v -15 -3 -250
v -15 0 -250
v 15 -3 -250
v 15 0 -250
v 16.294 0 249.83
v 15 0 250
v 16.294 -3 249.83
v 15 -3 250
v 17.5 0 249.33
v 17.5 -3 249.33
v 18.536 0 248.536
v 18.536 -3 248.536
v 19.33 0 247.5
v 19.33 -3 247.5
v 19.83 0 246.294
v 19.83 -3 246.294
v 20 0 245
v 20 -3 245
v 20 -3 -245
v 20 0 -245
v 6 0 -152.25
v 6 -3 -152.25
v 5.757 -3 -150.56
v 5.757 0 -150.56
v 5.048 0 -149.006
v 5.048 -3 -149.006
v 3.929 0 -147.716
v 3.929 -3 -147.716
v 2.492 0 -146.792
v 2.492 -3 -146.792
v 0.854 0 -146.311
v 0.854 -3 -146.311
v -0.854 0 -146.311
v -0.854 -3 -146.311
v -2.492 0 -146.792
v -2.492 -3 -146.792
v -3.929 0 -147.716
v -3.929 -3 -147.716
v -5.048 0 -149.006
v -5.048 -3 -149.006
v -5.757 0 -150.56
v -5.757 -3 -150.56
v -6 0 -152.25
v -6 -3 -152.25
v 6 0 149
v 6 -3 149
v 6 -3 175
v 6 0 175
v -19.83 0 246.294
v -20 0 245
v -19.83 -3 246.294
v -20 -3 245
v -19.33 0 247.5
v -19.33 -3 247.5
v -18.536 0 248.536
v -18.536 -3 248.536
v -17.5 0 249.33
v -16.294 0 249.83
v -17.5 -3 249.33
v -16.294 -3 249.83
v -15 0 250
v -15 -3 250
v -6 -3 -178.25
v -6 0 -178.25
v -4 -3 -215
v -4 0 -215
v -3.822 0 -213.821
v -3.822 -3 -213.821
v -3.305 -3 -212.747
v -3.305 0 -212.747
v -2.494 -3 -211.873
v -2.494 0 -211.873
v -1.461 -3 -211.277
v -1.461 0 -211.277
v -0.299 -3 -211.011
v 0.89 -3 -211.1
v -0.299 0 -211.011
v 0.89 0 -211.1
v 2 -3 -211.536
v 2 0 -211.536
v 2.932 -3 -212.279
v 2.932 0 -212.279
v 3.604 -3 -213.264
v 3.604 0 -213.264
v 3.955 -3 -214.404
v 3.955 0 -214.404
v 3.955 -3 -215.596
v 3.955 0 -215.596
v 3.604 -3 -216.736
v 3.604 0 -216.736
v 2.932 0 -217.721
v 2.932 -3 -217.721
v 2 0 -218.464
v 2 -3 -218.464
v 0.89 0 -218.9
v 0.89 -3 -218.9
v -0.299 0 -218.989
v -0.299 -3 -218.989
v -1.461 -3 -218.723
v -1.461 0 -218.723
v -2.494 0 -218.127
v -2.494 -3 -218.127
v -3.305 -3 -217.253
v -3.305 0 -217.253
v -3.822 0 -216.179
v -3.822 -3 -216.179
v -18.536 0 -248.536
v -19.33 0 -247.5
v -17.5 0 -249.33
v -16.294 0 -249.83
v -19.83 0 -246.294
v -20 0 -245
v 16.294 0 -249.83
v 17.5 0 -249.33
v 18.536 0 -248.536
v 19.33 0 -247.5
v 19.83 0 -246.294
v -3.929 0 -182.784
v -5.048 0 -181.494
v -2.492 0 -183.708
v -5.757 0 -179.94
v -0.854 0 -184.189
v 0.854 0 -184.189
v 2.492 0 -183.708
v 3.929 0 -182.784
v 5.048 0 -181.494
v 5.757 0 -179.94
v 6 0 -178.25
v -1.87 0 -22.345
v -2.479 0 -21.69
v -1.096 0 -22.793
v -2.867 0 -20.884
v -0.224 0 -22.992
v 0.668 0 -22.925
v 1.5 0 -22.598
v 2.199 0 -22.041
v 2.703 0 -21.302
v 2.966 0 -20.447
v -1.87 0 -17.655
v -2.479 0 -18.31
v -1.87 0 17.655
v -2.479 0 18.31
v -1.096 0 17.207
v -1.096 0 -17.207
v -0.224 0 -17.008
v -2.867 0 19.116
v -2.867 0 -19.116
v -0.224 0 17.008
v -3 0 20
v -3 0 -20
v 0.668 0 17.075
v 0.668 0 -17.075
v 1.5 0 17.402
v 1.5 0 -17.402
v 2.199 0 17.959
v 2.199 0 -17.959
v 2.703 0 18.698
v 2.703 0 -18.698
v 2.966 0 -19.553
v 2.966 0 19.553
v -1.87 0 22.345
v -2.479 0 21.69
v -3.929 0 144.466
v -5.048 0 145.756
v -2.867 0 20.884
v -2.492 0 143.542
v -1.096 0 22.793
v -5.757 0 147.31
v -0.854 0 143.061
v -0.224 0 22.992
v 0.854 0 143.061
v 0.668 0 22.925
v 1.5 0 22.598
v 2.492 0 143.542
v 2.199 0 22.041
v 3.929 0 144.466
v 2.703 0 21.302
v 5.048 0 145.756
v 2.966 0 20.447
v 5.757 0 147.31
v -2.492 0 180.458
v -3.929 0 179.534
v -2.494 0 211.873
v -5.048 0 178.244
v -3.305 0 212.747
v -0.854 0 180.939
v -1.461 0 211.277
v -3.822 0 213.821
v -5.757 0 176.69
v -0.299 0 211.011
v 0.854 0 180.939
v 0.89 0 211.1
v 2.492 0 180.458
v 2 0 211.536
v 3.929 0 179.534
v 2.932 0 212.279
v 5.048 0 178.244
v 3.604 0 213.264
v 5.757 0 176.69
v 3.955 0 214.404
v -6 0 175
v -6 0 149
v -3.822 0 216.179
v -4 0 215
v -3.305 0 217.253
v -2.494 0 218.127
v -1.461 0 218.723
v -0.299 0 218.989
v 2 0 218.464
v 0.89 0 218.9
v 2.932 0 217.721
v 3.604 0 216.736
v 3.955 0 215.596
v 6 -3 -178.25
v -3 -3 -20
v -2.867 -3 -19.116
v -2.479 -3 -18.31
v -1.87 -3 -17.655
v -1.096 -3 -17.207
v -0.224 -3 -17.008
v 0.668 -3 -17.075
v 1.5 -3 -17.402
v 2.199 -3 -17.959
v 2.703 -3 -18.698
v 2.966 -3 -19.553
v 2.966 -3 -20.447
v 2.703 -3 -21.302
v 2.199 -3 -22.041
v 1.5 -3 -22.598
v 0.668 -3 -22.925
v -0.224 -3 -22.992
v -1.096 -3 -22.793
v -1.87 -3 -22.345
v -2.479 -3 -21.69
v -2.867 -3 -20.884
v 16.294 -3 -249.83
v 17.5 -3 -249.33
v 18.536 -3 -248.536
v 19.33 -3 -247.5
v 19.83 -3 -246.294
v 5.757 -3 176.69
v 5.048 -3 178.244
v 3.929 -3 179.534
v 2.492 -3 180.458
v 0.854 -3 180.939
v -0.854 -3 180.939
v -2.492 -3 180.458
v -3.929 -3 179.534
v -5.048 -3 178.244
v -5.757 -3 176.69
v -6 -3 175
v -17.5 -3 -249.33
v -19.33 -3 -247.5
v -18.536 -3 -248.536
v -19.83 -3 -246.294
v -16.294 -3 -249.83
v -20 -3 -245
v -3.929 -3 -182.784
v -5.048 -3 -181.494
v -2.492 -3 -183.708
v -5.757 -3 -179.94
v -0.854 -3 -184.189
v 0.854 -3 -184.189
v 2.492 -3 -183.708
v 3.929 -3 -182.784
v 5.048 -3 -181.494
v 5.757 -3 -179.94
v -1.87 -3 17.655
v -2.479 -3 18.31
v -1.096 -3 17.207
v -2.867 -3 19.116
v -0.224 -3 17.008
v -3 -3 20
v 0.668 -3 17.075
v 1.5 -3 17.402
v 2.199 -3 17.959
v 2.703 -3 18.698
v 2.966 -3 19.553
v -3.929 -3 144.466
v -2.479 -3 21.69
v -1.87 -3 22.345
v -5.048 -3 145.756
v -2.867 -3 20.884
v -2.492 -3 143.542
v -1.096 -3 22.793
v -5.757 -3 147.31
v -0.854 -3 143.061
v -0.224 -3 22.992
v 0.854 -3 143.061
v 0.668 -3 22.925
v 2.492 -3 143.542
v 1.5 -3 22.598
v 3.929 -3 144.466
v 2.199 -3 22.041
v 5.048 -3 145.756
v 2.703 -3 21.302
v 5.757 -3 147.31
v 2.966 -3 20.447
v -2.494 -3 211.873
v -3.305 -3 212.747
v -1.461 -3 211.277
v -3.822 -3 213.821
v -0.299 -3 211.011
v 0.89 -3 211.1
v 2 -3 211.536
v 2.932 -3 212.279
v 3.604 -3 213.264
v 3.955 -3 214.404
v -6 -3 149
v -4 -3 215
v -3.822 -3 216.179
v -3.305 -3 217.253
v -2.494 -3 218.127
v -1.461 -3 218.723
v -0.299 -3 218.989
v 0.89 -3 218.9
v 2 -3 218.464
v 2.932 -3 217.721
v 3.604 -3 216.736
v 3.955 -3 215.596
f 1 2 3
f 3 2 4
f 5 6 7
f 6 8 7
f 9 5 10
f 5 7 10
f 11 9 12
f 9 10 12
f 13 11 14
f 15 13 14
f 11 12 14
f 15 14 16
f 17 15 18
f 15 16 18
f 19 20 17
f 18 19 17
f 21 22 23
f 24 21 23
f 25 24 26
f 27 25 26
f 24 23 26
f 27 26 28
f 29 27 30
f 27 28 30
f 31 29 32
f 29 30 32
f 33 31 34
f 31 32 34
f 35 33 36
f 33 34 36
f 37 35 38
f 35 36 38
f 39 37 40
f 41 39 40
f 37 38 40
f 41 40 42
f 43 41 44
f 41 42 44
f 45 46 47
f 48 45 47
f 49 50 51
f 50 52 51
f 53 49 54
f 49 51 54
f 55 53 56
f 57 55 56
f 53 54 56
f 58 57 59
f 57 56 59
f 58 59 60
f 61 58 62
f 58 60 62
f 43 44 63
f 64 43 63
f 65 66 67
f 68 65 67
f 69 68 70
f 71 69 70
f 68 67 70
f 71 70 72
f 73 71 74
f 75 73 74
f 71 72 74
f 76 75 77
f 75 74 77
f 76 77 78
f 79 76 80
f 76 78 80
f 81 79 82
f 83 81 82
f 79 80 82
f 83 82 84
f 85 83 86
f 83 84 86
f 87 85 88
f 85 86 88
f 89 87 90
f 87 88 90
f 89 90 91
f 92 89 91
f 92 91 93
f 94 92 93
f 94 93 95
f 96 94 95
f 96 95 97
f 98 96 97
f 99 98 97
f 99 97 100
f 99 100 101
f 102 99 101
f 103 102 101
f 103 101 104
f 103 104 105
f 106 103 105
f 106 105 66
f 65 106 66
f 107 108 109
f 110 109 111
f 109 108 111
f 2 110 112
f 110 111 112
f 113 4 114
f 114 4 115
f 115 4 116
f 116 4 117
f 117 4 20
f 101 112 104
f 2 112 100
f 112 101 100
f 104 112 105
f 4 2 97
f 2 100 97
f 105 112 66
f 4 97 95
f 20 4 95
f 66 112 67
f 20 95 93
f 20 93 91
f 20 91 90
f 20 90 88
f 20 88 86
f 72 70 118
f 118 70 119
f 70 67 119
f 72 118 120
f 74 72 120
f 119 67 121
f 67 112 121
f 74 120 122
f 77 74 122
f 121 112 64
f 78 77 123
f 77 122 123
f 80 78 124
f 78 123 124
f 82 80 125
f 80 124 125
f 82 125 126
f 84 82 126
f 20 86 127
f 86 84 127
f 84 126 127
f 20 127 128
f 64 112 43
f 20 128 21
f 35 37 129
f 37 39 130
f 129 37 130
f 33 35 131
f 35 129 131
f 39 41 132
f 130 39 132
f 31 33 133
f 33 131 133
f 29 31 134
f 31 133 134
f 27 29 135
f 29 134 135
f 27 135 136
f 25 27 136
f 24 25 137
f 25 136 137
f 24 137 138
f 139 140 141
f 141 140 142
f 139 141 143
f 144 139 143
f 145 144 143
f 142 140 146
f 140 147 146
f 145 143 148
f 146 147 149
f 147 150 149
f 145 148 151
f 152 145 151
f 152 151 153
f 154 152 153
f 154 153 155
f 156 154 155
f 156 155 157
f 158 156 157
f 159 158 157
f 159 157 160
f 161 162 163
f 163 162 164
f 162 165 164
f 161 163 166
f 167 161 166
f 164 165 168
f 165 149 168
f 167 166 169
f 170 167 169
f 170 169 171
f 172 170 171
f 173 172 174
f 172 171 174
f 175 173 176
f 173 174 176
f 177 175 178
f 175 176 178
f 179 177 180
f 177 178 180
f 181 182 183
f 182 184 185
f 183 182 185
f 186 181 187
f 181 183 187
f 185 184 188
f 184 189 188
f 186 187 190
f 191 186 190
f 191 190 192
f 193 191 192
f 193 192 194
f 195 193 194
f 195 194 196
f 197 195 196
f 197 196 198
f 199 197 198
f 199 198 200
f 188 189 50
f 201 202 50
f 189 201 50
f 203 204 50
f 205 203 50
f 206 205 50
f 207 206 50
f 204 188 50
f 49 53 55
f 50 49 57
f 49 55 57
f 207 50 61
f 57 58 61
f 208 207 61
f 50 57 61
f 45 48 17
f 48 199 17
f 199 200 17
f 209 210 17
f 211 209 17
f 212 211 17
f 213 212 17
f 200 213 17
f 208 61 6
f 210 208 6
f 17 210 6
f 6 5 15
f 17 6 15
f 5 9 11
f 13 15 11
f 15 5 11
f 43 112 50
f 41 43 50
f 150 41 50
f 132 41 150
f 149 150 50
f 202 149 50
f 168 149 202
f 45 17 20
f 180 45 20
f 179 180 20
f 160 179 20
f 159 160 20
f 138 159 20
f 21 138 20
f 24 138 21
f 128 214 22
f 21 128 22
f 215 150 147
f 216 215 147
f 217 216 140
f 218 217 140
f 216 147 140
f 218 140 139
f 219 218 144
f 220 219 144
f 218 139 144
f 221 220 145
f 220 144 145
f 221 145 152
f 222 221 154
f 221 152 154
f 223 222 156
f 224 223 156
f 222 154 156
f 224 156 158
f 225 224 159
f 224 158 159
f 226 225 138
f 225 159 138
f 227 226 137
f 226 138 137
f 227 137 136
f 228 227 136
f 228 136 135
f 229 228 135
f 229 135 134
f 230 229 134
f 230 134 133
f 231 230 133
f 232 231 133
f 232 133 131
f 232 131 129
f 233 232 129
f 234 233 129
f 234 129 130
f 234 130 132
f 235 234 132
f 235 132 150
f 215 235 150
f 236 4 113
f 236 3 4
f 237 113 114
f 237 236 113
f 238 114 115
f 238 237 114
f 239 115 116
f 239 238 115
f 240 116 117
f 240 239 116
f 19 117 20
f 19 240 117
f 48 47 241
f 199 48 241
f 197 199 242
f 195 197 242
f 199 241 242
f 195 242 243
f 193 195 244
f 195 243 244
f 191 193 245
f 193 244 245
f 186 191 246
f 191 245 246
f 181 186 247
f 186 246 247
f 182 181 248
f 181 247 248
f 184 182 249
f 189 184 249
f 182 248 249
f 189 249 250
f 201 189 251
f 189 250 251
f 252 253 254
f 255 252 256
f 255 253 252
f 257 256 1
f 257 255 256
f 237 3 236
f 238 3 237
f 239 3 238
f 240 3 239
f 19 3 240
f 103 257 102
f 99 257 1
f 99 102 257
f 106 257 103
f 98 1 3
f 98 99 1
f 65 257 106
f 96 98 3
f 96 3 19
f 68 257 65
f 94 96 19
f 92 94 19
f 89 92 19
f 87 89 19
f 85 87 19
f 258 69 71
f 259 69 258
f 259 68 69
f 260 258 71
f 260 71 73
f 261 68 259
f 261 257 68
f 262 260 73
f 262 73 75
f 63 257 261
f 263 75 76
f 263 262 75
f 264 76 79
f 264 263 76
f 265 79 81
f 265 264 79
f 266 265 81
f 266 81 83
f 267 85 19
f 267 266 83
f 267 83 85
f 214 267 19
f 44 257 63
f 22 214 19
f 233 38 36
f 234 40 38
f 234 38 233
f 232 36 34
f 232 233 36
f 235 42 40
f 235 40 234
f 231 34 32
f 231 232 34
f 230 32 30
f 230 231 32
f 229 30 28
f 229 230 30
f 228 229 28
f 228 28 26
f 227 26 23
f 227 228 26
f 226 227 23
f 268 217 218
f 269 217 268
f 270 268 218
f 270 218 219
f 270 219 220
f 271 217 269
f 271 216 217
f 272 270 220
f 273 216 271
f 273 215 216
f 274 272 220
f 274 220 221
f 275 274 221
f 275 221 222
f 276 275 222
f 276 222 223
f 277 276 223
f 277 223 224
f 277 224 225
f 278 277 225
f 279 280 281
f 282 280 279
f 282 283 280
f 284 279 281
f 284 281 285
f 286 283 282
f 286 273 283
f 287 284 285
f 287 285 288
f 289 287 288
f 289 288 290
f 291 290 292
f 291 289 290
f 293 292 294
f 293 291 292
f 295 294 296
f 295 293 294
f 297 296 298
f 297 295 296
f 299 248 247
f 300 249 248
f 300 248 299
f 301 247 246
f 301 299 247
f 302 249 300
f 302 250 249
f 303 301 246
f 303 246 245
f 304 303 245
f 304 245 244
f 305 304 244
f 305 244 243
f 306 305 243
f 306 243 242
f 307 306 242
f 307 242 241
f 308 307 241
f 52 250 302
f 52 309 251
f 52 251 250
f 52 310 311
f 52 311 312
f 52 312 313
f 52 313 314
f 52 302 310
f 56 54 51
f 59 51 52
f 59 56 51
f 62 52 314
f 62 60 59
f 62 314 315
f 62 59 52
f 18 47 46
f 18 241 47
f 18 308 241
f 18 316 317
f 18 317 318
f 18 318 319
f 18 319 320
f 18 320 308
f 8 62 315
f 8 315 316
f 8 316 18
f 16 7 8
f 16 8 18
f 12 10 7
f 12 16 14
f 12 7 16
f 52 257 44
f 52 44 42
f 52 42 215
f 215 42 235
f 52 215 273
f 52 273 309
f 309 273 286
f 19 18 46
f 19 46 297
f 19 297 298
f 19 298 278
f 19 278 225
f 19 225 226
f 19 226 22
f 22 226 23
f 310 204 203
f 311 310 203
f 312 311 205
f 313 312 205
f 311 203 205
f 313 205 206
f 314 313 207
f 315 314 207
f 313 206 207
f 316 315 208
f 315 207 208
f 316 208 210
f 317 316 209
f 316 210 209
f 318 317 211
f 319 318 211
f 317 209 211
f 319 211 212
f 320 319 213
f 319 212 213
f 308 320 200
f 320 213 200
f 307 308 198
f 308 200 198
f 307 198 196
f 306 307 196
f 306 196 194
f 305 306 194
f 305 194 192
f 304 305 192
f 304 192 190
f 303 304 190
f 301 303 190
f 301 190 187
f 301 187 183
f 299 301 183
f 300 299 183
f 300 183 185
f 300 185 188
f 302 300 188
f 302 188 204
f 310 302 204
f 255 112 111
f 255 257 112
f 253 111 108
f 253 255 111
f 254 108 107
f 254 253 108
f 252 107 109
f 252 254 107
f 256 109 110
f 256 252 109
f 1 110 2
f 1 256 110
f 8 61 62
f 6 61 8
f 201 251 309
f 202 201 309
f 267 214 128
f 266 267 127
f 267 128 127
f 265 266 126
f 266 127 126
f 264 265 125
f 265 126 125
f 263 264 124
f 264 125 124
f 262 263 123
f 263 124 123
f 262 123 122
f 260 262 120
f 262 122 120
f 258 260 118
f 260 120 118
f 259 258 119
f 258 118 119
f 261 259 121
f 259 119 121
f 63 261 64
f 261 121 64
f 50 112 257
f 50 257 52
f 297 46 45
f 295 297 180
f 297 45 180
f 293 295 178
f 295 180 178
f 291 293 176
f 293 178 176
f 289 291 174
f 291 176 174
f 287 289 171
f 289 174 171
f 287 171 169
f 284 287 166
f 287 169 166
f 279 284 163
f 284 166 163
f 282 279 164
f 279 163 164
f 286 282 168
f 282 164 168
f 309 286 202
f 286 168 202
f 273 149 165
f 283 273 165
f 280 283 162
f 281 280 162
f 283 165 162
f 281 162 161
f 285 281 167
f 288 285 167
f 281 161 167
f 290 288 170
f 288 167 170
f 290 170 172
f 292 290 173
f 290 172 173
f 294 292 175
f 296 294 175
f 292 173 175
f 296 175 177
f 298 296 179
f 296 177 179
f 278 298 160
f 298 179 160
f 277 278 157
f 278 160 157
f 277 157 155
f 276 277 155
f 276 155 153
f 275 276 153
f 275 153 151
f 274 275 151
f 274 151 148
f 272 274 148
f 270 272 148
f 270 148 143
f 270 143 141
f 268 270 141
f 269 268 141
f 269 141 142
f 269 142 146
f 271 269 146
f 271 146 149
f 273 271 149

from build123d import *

# Parameters (mm, degrees)
F0_W      = 40
F0_H      = 500
F1_DEPTH  = 3
F3_D      = 8
F5_D      = 12
F7_DEPTH  = 6
F8_D      = 12
F10_DEPTH = 6
F12_DEPTH = 6
F13_R     = 5
F15_D     = 6


with BuildPart() as f1:
    # F0 (on Front) → F1 (new body)
    with BuildSketch(Plane.XZ):
        Rectangle(F0_W, F0_H)
    extrude(amount=F1_DEPTH)

    # F3 (through all)
    with Locations(Plane.XZ.offset(3)):
        with Locations((0, -215), (0, 215)):
            Hole(F3_D / 2)

    # F5 (through all)
    with Locations(Plane.XZ.offset(3)):
        with Locations((0, 149)):
            Hole(F5_D / 2)

    # F6 (on face) → F7 (cut)
    with BuildSketch(Plane.XZ.offset(3)):
        with BuildLine():
            ThreePointArc((-3, 155), (0, 152), (3, 155))
            Line((3, 155), (3, 175))
            ThreePointArc((3, 175), (0, 178), (-3, 175))
            Line((-3, 175), (-3, 155))
        make_face()
    extrude(amount=-F7_DEPTH, mode=Mode.SUBTRACT)

    # F8 (through all)
    with Locations(Plane.XZ.offset(3)):
        with Locations((0, -178.25)):
            Hole(F8_D / 2)

    # F9 (on face) → F10 (cut)
    with BuildSketch(Plane.XZ.offset(3)):
        with BuildLine():
            ThreePointArc((-3, -172.25), (0, -175.25), (3, -172.25))
            Line((3, -172.25), (3, -152.25))
            ThreePointArc((3, -152.25), (0, -149.25), (-3, -152.25))
            Line((-3, -152.25), (-3, -172.25))
        make_face()
    extrude(amount=-F10_DEPTH, mode=Mode.SUBTRACT)

    # F11 (on face) → F12 (cut)
    with BuildSketch(Plane.XZ.offset(3)):
        with BuildLine():
            ThreePointArc((-6, 149), (0, 143), (6, 149))
            Line((6, 149), (6, 175))
            ThreePointArc((6, 175), (0, 181), (-6, 175))
            Line((-6, 175), (-6, 149))
        make_face()
        with BuildLine():
            ThreePointArc((-6, -178.25), (0, -184.25), (6, -178.25))
            Line((6, -178.25), (6, -152.25))
            ThreePointArc((6, -152.25), (0, -146.25), (-6, -152.25))
            Line((-6, -152.25), (-6, -178.25))
        make_face()
    extrude(amount=-F12_DEPTH, mode=Mode.SUBTRACT)

    # F13
    f13_edges = [f1.edges().sort_by_distance(p)[0] for p in [
        (20, -1.5, 250),
        (-20, -1.5, 250),
        (20, -1.5, -250),
        (-20, -1.5, -250),
    ]]
    fillet(f13_edges, radius=F13_R)

    # F15 (through all)
    with Locations(Plane.XZ.offset(3)):
        with Locations((0, 20), (0, -20)):
            Hole(F15_D / 2)


solid = f1.part
